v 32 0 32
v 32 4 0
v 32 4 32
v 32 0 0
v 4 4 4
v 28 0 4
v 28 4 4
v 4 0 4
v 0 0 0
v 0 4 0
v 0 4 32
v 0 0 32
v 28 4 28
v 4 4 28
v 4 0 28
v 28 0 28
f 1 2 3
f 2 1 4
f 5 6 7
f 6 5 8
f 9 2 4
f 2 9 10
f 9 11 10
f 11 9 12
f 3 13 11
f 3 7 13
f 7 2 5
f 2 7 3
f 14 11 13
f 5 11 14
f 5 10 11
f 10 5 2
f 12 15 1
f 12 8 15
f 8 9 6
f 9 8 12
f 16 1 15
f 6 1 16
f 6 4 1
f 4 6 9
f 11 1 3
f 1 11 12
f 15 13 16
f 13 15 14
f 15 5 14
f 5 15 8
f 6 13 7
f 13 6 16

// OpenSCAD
// U-shaped spring clip.
$fn = 60;
eps = 0.02;
clip_w = 32;
clip_h = 32;
clip_t = 4;
union() { cube([clip_w,clip_t,clip_t]); translate([0,0,clip_h-clip_t]) cube([clip_w,clip_t,clip_t]); cube([clip_t,clip_t,clip_h]); translate([clip_w-clip_t,0,0]) cube([clip_t,clip_t,clip_h]); }
